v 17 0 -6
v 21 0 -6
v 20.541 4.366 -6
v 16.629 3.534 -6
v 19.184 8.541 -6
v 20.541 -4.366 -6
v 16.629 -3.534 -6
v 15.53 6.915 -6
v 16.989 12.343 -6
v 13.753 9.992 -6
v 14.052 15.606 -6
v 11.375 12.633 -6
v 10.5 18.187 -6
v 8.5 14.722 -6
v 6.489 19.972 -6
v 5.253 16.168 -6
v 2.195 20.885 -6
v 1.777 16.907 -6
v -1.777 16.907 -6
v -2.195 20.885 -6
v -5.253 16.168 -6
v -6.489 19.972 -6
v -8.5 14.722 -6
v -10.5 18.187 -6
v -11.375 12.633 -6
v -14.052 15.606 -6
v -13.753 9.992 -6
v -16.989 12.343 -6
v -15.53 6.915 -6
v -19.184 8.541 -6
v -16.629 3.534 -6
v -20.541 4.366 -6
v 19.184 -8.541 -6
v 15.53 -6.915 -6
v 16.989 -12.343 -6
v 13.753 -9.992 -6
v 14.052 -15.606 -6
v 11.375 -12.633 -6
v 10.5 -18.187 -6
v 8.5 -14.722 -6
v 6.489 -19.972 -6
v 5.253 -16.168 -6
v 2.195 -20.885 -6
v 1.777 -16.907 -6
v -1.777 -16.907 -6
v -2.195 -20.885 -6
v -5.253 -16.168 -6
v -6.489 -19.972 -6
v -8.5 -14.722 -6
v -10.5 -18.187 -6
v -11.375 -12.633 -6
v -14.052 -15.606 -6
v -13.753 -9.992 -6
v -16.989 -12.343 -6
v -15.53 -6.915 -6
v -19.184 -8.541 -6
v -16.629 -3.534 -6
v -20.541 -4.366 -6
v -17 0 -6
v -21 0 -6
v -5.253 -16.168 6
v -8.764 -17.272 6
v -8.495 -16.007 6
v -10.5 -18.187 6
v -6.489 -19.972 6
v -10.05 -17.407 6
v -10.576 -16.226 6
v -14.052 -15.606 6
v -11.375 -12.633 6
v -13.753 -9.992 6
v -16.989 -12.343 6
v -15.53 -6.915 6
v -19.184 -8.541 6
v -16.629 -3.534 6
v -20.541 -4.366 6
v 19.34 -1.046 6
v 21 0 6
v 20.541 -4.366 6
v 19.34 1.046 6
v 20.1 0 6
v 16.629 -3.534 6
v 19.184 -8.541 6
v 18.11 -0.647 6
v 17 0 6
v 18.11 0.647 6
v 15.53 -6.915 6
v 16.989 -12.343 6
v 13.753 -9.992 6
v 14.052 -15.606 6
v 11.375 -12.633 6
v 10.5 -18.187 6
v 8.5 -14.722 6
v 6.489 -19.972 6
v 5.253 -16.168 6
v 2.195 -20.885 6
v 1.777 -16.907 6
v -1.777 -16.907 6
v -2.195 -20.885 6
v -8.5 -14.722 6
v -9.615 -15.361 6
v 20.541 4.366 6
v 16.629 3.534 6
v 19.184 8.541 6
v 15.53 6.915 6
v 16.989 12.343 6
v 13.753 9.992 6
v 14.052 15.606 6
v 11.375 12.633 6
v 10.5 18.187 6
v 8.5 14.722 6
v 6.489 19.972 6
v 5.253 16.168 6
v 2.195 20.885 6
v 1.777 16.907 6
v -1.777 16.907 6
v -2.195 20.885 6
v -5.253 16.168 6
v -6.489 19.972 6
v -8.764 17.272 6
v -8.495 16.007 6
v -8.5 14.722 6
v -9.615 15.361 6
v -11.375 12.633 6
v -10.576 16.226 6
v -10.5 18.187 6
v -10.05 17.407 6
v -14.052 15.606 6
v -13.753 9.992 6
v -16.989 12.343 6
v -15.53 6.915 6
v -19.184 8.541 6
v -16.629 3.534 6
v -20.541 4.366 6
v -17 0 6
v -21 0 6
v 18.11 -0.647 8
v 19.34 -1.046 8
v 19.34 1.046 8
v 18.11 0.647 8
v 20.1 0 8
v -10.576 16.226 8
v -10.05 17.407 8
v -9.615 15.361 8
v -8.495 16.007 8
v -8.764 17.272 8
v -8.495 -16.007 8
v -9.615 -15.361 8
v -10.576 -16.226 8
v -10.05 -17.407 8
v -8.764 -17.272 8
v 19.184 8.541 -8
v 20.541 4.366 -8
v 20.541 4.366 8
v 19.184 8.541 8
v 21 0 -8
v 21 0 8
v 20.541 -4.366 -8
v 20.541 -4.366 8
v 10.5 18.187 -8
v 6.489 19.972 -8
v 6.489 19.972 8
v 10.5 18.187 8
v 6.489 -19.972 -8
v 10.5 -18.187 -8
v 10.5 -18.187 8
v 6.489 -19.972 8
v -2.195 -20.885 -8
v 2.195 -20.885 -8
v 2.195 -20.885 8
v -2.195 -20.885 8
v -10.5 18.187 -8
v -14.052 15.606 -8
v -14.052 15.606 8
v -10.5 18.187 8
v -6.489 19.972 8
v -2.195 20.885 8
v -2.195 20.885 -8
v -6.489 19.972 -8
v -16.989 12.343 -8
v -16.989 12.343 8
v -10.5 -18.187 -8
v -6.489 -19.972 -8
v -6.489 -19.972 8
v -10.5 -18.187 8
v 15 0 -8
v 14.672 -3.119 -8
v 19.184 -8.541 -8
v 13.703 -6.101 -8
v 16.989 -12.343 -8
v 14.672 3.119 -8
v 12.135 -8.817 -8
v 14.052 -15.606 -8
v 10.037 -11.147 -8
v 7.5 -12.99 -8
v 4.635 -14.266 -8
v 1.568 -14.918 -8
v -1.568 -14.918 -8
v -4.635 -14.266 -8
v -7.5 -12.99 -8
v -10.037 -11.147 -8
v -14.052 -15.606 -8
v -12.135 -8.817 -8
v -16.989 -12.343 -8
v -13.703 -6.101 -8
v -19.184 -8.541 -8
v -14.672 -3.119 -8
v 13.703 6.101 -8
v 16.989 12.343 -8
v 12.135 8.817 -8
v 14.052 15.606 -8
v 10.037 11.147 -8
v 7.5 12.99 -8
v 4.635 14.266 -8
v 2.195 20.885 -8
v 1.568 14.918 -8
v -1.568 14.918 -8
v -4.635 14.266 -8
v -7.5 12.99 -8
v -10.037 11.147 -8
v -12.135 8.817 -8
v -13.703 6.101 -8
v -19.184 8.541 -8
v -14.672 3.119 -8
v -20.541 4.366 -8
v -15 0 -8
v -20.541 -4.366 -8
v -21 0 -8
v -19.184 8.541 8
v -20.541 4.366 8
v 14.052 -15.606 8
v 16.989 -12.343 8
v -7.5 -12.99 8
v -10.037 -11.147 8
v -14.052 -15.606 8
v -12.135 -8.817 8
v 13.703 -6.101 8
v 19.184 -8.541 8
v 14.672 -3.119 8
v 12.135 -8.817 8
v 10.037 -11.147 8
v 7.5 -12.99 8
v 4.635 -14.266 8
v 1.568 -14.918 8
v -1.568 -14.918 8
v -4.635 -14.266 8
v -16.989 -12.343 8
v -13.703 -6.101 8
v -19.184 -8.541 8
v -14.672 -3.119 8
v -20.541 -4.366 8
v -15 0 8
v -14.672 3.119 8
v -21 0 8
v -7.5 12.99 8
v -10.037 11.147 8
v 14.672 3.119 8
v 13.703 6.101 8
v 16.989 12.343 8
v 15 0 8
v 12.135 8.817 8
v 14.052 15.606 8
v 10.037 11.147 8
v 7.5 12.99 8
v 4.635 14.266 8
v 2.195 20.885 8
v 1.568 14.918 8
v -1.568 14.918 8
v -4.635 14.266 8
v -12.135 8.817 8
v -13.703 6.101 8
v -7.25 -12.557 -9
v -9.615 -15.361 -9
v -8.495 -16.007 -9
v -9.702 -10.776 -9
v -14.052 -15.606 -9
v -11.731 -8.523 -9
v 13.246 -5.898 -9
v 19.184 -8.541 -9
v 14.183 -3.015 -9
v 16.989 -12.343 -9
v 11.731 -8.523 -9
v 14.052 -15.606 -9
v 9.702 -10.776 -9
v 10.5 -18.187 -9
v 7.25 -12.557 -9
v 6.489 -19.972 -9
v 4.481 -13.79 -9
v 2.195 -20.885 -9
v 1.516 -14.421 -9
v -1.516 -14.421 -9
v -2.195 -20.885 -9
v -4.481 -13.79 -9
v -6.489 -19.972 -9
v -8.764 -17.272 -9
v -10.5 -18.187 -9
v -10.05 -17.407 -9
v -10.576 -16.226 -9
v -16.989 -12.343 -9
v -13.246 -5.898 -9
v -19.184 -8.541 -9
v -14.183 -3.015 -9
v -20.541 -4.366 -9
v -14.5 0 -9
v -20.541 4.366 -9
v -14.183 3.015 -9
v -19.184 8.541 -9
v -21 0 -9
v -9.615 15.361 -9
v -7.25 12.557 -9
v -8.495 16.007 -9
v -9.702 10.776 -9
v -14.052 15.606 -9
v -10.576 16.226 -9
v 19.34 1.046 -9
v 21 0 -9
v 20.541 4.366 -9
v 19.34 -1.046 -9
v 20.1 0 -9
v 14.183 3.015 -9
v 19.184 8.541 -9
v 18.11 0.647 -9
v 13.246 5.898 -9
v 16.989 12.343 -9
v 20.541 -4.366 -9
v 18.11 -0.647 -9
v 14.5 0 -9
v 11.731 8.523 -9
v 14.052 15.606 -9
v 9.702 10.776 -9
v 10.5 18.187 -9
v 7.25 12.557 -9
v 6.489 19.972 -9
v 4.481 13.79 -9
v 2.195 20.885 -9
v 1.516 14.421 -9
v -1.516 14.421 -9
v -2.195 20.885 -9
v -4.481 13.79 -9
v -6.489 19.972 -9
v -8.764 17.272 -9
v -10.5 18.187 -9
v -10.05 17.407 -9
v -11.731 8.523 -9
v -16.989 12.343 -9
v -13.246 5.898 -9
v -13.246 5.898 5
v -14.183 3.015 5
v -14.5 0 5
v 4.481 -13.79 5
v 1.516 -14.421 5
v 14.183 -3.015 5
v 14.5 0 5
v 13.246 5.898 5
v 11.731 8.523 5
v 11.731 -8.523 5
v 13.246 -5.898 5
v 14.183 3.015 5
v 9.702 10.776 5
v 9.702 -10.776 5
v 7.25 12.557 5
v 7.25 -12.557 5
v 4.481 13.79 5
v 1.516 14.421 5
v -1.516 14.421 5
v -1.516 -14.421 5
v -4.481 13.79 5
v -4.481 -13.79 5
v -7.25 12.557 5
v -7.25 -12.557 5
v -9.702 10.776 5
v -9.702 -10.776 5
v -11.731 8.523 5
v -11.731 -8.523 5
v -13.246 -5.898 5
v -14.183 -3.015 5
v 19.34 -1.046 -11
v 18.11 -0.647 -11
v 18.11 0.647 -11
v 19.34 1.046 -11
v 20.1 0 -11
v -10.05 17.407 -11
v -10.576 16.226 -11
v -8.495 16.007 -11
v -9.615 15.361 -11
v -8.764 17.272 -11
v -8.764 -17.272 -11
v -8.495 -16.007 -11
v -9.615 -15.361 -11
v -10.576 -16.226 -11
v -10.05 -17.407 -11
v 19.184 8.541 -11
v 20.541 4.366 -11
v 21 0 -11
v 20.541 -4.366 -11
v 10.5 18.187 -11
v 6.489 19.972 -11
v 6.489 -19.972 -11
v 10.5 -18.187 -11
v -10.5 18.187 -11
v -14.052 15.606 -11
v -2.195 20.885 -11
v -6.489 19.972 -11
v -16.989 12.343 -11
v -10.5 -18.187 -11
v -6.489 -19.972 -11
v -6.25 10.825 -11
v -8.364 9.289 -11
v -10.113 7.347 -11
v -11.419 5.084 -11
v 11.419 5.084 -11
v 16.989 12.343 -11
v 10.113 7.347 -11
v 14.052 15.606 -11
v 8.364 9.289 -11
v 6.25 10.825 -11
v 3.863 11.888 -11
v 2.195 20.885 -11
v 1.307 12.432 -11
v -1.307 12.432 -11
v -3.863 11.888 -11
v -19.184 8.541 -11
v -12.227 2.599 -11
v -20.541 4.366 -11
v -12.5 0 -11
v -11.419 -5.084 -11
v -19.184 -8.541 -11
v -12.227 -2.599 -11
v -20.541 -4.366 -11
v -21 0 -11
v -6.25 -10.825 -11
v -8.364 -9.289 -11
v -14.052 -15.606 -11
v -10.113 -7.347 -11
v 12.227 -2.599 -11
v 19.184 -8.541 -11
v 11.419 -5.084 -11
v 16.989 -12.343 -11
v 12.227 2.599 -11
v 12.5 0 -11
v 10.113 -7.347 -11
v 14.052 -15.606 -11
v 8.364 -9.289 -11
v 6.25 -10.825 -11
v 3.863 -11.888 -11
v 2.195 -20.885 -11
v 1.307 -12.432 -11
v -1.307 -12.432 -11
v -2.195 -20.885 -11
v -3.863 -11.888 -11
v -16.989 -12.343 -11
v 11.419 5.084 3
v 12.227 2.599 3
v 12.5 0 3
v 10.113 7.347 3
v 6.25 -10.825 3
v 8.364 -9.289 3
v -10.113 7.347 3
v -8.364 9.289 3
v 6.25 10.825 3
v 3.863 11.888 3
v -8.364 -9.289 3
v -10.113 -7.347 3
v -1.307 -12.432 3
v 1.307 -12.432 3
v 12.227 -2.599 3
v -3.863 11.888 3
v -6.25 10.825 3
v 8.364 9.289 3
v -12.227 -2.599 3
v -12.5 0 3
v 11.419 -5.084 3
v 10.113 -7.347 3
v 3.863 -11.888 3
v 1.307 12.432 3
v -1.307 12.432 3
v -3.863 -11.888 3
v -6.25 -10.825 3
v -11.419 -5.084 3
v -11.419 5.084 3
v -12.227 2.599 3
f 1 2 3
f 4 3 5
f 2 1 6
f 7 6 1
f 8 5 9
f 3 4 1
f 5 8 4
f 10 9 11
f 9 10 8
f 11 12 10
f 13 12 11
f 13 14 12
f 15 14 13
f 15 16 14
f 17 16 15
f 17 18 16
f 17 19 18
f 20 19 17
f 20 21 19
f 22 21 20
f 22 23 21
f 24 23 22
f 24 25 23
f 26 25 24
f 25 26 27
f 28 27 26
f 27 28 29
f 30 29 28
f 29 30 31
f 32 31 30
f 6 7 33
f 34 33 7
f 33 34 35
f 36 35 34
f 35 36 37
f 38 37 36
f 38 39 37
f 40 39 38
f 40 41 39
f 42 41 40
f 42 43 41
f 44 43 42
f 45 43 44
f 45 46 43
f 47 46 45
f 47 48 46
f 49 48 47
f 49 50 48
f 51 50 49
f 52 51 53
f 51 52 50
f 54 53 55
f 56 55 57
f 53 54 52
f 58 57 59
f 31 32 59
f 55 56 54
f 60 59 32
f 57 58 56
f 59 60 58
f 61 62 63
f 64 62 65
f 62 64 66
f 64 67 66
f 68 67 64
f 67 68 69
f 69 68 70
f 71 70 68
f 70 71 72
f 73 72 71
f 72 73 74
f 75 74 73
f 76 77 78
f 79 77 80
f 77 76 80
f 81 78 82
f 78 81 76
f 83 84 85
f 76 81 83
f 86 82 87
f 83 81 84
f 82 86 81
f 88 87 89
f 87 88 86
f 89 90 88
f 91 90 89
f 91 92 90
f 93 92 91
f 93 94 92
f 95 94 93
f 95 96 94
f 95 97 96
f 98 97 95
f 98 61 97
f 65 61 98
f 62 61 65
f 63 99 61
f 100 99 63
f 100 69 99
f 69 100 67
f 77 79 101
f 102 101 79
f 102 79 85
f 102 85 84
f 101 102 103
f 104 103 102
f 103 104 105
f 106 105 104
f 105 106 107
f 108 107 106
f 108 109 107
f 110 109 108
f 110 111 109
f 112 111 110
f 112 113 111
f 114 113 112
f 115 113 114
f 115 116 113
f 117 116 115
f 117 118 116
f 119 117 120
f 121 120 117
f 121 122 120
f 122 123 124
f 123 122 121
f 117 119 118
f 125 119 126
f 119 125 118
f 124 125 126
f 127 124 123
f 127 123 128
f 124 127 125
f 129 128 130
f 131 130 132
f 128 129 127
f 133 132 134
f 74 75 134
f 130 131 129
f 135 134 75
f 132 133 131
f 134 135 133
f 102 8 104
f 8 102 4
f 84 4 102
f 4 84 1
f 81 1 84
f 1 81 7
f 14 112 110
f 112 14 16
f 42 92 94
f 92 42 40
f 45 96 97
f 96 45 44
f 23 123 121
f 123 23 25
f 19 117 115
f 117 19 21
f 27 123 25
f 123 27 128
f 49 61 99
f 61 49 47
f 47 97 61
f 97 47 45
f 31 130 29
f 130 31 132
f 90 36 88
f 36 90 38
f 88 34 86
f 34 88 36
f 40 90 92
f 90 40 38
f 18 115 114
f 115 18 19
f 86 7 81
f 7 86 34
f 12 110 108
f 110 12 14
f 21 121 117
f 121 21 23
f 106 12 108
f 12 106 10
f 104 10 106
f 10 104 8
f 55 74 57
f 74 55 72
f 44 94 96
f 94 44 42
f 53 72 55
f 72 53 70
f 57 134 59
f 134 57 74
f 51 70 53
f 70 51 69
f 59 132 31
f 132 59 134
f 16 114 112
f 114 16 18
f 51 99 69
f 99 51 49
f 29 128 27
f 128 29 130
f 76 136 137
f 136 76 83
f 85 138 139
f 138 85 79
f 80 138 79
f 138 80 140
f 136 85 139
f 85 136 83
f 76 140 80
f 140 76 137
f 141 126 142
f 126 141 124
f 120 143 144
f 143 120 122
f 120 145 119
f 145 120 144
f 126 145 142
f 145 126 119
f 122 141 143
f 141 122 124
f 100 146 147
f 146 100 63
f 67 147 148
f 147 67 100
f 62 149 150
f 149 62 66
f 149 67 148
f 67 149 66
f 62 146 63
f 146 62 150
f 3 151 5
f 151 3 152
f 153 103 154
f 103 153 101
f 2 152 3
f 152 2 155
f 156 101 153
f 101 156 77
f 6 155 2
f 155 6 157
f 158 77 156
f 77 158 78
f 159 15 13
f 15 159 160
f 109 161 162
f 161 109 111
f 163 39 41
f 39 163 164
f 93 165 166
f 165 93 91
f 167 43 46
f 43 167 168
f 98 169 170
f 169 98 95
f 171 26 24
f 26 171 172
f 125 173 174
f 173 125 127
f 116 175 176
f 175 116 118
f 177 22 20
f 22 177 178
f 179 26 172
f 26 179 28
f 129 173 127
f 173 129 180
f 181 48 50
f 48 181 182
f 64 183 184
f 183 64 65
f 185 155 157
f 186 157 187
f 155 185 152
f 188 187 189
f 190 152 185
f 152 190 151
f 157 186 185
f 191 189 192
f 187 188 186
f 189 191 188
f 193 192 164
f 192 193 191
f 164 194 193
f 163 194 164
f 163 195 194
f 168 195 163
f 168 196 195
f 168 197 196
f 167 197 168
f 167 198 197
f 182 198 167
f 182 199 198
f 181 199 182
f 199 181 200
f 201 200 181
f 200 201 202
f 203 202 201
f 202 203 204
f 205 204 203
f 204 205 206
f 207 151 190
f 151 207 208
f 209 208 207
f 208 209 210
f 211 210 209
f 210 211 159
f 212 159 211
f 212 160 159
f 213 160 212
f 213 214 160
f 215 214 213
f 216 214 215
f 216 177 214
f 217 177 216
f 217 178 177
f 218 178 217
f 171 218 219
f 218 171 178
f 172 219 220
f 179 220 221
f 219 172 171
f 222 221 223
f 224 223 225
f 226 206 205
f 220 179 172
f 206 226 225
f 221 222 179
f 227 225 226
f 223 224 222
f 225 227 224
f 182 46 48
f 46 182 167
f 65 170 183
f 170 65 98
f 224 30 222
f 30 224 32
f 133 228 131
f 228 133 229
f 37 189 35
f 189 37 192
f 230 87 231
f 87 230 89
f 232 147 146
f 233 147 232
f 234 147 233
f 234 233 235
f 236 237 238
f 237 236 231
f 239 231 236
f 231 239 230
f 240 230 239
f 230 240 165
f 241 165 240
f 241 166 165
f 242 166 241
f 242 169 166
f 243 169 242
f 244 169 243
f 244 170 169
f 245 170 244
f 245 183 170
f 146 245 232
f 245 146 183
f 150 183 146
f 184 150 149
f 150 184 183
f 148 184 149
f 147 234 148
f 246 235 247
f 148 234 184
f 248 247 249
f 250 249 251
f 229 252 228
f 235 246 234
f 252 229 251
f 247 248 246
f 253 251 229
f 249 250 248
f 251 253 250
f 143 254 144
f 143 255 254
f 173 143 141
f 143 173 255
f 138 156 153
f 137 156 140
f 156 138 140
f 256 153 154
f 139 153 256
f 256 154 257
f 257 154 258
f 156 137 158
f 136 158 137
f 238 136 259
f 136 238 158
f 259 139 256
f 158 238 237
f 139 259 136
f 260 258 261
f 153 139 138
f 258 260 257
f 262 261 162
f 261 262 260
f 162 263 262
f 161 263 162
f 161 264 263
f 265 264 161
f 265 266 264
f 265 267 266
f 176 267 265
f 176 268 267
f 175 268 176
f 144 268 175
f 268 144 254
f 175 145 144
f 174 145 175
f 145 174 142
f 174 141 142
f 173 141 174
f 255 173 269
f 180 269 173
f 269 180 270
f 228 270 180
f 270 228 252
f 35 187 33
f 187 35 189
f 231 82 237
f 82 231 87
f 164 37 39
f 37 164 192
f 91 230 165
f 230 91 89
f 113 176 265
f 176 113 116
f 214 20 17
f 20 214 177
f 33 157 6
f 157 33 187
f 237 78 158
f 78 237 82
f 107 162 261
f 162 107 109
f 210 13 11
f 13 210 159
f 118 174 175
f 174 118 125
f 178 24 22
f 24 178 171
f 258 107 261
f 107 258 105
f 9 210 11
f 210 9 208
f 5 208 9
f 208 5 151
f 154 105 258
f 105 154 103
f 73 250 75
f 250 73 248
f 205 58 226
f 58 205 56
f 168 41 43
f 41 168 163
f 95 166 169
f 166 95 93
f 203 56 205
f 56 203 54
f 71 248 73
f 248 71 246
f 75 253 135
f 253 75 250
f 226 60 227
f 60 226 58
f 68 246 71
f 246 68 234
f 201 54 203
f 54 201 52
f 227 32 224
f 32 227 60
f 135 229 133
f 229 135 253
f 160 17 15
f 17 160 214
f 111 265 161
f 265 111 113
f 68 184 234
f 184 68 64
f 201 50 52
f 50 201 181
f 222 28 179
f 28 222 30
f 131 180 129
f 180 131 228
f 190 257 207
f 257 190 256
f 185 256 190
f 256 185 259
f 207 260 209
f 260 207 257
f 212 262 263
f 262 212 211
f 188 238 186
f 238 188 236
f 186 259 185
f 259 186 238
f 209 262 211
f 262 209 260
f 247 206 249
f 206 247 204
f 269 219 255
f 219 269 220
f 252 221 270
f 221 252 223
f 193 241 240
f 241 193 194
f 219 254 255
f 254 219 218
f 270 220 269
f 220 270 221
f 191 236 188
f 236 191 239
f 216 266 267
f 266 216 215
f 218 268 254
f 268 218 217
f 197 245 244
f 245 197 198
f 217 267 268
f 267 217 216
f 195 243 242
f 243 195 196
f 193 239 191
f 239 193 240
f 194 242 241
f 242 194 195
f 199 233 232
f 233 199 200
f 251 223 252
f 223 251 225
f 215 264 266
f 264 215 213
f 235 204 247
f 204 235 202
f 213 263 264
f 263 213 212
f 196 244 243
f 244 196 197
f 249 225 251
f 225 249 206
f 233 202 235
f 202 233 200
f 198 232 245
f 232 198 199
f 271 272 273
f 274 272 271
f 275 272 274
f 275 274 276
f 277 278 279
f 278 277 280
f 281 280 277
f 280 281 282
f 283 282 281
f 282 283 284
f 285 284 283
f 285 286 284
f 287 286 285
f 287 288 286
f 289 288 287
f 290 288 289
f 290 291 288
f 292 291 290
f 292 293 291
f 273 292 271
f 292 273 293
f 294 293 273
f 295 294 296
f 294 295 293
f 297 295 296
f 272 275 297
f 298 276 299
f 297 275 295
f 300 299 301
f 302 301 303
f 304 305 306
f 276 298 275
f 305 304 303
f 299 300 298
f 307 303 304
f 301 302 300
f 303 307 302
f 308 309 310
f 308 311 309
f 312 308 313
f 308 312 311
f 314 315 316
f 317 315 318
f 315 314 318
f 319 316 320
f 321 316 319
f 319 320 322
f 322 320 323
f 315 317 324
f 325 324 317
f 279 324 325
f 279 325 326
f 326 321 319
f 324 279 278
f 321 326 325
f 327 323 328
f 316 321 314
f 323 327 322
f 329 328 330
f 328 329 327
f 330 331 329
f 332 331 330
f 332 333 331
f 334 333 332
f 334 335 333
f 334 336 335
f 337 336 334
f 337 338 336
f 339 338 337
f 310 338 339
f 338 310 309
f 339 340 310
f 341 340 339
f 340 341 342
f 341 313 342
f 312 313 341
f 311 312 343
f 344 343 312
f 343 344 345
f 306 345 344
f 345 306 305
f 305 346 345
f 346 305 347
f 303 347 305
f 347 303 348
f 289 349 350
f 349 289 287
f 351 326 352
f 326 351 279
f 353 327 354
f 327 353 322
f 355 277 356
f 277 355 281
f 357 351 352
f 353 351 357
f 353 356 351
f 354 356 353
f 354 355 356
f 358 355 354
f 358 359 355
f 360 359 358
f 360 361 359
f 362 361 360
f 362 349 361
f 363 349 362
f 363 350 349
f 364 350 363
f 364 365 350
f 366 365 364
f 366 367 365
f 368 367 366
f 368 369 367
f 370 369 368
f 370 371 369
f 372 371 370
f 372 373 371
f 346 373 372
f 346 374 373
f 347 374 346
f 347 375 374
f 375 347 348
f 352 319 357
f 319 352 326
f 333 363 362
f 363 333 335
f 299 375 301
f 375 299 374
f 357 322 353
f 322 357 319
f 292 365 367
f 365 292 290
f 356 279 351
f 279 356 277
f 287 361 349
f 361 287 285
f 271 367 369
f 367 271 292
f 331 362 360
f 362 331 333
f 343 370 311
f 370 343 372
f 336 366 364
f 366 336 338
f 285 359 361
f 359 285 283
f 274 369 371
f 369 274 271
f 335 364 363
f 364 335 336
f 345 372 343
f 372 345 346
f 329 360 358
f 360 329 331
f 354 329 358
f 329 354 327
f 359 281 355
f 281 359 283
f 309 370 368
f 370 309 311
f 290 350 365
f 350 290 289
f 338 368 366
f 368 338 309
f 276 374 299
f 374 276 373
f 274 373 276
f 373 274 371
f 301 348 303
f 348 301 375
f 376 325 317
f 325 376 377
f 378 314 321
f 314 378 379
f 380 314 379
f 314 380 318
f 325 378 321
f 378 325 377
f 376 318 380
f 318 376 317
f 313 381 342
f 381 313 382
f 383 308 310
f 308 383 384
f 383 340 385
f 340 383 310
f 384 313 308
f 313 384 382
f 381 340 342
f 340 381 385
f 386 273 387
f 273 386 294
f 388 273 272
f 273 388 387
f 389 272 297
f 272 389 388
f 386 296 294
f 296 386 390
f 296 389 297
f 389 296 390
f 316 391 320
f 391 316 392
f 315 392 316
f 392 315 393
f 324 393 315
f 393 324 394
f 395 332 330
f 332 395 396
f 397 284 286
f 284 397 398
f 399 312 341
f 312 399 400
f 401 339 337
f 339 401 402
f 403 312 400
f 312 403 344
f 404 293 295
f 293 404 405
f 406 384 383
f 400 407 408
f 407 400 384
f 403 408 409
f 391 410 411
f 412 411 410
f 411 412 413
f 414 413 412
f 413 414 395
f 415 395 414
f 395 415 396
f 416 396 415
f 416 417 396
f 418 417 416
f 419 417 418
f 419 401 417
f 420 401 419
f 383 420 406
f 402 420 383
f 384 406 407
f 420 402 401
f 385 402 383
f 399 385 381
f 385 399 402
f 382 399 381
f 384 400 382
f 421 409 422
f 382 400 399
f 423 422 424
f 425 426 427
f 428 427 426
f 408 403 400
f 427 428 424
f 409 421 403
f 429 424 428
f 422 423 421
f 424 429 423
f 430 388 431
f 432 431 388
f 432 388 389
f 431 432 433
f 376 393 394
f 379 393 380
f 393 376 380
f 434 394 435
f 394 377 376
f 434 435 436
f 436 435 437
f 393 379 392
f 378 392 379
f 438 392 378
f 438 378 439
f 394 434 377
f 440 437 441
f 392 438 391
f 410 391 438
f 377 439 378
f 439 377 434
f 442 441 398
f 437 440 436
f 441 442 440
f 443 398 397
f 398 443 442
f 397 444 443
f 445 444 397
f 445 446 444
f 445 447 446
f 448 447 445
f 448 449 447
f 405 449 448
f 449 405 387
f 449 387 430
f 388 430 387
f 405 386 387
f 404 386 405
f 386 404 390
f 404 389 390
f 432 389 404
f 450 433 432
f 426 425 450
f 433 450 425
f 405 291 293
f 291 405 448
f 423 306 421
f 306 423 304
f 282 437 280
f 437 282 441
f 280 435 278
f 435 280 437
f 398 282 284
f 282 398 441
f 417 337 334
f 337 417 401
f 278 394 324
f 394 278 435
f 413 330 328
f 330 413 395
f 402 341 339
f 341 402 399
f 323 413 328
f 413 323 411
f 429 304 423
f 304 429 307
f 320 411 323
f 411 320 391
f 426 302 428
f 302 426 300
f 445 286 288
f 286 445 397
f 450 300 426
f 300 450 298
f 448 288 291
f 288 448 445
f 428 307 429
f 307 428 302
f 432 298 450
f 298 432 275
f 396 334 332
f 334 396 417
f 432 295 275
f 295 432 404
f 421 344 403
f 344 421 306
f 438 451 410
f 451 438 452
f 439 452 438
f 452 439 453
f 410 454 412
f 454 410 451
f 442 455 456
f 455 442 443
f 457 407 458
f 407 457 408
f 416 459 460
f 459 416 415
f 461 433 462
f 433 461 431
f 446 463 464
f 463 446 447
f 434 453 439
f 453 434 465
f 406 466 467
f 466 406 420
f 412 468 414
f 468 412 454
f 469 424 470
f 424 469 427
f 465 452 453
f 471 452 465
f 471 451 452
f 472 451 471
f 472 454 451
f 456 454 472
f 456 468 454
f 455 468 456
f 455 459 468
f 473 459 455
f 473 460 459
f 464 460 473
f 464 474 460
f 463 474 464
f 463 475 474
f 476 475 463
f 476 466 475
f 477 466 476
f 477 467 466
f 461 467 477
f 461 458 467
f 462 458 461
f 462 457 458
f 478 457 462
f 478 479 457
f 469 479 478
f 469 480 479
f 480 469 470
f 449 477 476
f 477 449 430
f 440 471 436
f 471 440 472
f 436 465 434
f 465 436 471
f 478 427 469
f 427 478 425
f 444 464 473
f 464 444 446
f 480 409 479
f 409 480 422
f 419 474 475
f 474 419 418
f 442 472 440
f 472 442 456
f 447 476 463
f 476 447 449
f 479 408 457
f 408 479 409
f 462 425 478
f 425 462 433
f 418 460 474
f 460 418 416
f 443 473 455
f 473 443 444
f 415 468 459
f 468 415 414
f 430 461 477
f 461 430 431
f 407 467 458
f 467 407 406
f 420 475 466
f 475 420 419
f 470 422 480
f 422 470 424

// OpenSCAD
// file: magnets_holder.scad
module magnets_holder()
{
    difference() {
        cylinder(h = 16, r = 21,center=true);
        translate(v = [0, 0, -2]) cylinder(h = 16, r = 12.5,center=true);
        translate(v = [0, 0, 2]) difference() {
            cylinder(h = 16, r = 22,center=true);
            translate(v = [0, 0, -2]) cylinder(h = 16, r = 29/2,center=true);
        }
        for(i = [0:120:360])
        {
            rotate(i, v = [0, 0, 1]) translate(v = [19, 0, 0]) cylinder(h = 20, r = 1.1, center=true);
        }
    }
}

magnets_holder();
// main file
use <magnets_holder.scad>

module coil()
{
    difference() {
        cylinder(h = 16, r = 21,center=true);
        cylinder(h = 20, r = 15,center=true);
        difference() {
            cylinder(h = 12, r = 24,center=true);
            translate(v = [0, 0, -2]) cylinder(h = 16, r = 34/2,center=true);
        }
        for(i = [0:120:360])
        {
            rotate(i, v = [0, 0, 1]) translate(v = [19, 0, 10]) cylinder(h = 10, r = 1.1, center=true);
        }
    }
}

coil();

translate(v = [0, 0, -3]) magnets_holder();
